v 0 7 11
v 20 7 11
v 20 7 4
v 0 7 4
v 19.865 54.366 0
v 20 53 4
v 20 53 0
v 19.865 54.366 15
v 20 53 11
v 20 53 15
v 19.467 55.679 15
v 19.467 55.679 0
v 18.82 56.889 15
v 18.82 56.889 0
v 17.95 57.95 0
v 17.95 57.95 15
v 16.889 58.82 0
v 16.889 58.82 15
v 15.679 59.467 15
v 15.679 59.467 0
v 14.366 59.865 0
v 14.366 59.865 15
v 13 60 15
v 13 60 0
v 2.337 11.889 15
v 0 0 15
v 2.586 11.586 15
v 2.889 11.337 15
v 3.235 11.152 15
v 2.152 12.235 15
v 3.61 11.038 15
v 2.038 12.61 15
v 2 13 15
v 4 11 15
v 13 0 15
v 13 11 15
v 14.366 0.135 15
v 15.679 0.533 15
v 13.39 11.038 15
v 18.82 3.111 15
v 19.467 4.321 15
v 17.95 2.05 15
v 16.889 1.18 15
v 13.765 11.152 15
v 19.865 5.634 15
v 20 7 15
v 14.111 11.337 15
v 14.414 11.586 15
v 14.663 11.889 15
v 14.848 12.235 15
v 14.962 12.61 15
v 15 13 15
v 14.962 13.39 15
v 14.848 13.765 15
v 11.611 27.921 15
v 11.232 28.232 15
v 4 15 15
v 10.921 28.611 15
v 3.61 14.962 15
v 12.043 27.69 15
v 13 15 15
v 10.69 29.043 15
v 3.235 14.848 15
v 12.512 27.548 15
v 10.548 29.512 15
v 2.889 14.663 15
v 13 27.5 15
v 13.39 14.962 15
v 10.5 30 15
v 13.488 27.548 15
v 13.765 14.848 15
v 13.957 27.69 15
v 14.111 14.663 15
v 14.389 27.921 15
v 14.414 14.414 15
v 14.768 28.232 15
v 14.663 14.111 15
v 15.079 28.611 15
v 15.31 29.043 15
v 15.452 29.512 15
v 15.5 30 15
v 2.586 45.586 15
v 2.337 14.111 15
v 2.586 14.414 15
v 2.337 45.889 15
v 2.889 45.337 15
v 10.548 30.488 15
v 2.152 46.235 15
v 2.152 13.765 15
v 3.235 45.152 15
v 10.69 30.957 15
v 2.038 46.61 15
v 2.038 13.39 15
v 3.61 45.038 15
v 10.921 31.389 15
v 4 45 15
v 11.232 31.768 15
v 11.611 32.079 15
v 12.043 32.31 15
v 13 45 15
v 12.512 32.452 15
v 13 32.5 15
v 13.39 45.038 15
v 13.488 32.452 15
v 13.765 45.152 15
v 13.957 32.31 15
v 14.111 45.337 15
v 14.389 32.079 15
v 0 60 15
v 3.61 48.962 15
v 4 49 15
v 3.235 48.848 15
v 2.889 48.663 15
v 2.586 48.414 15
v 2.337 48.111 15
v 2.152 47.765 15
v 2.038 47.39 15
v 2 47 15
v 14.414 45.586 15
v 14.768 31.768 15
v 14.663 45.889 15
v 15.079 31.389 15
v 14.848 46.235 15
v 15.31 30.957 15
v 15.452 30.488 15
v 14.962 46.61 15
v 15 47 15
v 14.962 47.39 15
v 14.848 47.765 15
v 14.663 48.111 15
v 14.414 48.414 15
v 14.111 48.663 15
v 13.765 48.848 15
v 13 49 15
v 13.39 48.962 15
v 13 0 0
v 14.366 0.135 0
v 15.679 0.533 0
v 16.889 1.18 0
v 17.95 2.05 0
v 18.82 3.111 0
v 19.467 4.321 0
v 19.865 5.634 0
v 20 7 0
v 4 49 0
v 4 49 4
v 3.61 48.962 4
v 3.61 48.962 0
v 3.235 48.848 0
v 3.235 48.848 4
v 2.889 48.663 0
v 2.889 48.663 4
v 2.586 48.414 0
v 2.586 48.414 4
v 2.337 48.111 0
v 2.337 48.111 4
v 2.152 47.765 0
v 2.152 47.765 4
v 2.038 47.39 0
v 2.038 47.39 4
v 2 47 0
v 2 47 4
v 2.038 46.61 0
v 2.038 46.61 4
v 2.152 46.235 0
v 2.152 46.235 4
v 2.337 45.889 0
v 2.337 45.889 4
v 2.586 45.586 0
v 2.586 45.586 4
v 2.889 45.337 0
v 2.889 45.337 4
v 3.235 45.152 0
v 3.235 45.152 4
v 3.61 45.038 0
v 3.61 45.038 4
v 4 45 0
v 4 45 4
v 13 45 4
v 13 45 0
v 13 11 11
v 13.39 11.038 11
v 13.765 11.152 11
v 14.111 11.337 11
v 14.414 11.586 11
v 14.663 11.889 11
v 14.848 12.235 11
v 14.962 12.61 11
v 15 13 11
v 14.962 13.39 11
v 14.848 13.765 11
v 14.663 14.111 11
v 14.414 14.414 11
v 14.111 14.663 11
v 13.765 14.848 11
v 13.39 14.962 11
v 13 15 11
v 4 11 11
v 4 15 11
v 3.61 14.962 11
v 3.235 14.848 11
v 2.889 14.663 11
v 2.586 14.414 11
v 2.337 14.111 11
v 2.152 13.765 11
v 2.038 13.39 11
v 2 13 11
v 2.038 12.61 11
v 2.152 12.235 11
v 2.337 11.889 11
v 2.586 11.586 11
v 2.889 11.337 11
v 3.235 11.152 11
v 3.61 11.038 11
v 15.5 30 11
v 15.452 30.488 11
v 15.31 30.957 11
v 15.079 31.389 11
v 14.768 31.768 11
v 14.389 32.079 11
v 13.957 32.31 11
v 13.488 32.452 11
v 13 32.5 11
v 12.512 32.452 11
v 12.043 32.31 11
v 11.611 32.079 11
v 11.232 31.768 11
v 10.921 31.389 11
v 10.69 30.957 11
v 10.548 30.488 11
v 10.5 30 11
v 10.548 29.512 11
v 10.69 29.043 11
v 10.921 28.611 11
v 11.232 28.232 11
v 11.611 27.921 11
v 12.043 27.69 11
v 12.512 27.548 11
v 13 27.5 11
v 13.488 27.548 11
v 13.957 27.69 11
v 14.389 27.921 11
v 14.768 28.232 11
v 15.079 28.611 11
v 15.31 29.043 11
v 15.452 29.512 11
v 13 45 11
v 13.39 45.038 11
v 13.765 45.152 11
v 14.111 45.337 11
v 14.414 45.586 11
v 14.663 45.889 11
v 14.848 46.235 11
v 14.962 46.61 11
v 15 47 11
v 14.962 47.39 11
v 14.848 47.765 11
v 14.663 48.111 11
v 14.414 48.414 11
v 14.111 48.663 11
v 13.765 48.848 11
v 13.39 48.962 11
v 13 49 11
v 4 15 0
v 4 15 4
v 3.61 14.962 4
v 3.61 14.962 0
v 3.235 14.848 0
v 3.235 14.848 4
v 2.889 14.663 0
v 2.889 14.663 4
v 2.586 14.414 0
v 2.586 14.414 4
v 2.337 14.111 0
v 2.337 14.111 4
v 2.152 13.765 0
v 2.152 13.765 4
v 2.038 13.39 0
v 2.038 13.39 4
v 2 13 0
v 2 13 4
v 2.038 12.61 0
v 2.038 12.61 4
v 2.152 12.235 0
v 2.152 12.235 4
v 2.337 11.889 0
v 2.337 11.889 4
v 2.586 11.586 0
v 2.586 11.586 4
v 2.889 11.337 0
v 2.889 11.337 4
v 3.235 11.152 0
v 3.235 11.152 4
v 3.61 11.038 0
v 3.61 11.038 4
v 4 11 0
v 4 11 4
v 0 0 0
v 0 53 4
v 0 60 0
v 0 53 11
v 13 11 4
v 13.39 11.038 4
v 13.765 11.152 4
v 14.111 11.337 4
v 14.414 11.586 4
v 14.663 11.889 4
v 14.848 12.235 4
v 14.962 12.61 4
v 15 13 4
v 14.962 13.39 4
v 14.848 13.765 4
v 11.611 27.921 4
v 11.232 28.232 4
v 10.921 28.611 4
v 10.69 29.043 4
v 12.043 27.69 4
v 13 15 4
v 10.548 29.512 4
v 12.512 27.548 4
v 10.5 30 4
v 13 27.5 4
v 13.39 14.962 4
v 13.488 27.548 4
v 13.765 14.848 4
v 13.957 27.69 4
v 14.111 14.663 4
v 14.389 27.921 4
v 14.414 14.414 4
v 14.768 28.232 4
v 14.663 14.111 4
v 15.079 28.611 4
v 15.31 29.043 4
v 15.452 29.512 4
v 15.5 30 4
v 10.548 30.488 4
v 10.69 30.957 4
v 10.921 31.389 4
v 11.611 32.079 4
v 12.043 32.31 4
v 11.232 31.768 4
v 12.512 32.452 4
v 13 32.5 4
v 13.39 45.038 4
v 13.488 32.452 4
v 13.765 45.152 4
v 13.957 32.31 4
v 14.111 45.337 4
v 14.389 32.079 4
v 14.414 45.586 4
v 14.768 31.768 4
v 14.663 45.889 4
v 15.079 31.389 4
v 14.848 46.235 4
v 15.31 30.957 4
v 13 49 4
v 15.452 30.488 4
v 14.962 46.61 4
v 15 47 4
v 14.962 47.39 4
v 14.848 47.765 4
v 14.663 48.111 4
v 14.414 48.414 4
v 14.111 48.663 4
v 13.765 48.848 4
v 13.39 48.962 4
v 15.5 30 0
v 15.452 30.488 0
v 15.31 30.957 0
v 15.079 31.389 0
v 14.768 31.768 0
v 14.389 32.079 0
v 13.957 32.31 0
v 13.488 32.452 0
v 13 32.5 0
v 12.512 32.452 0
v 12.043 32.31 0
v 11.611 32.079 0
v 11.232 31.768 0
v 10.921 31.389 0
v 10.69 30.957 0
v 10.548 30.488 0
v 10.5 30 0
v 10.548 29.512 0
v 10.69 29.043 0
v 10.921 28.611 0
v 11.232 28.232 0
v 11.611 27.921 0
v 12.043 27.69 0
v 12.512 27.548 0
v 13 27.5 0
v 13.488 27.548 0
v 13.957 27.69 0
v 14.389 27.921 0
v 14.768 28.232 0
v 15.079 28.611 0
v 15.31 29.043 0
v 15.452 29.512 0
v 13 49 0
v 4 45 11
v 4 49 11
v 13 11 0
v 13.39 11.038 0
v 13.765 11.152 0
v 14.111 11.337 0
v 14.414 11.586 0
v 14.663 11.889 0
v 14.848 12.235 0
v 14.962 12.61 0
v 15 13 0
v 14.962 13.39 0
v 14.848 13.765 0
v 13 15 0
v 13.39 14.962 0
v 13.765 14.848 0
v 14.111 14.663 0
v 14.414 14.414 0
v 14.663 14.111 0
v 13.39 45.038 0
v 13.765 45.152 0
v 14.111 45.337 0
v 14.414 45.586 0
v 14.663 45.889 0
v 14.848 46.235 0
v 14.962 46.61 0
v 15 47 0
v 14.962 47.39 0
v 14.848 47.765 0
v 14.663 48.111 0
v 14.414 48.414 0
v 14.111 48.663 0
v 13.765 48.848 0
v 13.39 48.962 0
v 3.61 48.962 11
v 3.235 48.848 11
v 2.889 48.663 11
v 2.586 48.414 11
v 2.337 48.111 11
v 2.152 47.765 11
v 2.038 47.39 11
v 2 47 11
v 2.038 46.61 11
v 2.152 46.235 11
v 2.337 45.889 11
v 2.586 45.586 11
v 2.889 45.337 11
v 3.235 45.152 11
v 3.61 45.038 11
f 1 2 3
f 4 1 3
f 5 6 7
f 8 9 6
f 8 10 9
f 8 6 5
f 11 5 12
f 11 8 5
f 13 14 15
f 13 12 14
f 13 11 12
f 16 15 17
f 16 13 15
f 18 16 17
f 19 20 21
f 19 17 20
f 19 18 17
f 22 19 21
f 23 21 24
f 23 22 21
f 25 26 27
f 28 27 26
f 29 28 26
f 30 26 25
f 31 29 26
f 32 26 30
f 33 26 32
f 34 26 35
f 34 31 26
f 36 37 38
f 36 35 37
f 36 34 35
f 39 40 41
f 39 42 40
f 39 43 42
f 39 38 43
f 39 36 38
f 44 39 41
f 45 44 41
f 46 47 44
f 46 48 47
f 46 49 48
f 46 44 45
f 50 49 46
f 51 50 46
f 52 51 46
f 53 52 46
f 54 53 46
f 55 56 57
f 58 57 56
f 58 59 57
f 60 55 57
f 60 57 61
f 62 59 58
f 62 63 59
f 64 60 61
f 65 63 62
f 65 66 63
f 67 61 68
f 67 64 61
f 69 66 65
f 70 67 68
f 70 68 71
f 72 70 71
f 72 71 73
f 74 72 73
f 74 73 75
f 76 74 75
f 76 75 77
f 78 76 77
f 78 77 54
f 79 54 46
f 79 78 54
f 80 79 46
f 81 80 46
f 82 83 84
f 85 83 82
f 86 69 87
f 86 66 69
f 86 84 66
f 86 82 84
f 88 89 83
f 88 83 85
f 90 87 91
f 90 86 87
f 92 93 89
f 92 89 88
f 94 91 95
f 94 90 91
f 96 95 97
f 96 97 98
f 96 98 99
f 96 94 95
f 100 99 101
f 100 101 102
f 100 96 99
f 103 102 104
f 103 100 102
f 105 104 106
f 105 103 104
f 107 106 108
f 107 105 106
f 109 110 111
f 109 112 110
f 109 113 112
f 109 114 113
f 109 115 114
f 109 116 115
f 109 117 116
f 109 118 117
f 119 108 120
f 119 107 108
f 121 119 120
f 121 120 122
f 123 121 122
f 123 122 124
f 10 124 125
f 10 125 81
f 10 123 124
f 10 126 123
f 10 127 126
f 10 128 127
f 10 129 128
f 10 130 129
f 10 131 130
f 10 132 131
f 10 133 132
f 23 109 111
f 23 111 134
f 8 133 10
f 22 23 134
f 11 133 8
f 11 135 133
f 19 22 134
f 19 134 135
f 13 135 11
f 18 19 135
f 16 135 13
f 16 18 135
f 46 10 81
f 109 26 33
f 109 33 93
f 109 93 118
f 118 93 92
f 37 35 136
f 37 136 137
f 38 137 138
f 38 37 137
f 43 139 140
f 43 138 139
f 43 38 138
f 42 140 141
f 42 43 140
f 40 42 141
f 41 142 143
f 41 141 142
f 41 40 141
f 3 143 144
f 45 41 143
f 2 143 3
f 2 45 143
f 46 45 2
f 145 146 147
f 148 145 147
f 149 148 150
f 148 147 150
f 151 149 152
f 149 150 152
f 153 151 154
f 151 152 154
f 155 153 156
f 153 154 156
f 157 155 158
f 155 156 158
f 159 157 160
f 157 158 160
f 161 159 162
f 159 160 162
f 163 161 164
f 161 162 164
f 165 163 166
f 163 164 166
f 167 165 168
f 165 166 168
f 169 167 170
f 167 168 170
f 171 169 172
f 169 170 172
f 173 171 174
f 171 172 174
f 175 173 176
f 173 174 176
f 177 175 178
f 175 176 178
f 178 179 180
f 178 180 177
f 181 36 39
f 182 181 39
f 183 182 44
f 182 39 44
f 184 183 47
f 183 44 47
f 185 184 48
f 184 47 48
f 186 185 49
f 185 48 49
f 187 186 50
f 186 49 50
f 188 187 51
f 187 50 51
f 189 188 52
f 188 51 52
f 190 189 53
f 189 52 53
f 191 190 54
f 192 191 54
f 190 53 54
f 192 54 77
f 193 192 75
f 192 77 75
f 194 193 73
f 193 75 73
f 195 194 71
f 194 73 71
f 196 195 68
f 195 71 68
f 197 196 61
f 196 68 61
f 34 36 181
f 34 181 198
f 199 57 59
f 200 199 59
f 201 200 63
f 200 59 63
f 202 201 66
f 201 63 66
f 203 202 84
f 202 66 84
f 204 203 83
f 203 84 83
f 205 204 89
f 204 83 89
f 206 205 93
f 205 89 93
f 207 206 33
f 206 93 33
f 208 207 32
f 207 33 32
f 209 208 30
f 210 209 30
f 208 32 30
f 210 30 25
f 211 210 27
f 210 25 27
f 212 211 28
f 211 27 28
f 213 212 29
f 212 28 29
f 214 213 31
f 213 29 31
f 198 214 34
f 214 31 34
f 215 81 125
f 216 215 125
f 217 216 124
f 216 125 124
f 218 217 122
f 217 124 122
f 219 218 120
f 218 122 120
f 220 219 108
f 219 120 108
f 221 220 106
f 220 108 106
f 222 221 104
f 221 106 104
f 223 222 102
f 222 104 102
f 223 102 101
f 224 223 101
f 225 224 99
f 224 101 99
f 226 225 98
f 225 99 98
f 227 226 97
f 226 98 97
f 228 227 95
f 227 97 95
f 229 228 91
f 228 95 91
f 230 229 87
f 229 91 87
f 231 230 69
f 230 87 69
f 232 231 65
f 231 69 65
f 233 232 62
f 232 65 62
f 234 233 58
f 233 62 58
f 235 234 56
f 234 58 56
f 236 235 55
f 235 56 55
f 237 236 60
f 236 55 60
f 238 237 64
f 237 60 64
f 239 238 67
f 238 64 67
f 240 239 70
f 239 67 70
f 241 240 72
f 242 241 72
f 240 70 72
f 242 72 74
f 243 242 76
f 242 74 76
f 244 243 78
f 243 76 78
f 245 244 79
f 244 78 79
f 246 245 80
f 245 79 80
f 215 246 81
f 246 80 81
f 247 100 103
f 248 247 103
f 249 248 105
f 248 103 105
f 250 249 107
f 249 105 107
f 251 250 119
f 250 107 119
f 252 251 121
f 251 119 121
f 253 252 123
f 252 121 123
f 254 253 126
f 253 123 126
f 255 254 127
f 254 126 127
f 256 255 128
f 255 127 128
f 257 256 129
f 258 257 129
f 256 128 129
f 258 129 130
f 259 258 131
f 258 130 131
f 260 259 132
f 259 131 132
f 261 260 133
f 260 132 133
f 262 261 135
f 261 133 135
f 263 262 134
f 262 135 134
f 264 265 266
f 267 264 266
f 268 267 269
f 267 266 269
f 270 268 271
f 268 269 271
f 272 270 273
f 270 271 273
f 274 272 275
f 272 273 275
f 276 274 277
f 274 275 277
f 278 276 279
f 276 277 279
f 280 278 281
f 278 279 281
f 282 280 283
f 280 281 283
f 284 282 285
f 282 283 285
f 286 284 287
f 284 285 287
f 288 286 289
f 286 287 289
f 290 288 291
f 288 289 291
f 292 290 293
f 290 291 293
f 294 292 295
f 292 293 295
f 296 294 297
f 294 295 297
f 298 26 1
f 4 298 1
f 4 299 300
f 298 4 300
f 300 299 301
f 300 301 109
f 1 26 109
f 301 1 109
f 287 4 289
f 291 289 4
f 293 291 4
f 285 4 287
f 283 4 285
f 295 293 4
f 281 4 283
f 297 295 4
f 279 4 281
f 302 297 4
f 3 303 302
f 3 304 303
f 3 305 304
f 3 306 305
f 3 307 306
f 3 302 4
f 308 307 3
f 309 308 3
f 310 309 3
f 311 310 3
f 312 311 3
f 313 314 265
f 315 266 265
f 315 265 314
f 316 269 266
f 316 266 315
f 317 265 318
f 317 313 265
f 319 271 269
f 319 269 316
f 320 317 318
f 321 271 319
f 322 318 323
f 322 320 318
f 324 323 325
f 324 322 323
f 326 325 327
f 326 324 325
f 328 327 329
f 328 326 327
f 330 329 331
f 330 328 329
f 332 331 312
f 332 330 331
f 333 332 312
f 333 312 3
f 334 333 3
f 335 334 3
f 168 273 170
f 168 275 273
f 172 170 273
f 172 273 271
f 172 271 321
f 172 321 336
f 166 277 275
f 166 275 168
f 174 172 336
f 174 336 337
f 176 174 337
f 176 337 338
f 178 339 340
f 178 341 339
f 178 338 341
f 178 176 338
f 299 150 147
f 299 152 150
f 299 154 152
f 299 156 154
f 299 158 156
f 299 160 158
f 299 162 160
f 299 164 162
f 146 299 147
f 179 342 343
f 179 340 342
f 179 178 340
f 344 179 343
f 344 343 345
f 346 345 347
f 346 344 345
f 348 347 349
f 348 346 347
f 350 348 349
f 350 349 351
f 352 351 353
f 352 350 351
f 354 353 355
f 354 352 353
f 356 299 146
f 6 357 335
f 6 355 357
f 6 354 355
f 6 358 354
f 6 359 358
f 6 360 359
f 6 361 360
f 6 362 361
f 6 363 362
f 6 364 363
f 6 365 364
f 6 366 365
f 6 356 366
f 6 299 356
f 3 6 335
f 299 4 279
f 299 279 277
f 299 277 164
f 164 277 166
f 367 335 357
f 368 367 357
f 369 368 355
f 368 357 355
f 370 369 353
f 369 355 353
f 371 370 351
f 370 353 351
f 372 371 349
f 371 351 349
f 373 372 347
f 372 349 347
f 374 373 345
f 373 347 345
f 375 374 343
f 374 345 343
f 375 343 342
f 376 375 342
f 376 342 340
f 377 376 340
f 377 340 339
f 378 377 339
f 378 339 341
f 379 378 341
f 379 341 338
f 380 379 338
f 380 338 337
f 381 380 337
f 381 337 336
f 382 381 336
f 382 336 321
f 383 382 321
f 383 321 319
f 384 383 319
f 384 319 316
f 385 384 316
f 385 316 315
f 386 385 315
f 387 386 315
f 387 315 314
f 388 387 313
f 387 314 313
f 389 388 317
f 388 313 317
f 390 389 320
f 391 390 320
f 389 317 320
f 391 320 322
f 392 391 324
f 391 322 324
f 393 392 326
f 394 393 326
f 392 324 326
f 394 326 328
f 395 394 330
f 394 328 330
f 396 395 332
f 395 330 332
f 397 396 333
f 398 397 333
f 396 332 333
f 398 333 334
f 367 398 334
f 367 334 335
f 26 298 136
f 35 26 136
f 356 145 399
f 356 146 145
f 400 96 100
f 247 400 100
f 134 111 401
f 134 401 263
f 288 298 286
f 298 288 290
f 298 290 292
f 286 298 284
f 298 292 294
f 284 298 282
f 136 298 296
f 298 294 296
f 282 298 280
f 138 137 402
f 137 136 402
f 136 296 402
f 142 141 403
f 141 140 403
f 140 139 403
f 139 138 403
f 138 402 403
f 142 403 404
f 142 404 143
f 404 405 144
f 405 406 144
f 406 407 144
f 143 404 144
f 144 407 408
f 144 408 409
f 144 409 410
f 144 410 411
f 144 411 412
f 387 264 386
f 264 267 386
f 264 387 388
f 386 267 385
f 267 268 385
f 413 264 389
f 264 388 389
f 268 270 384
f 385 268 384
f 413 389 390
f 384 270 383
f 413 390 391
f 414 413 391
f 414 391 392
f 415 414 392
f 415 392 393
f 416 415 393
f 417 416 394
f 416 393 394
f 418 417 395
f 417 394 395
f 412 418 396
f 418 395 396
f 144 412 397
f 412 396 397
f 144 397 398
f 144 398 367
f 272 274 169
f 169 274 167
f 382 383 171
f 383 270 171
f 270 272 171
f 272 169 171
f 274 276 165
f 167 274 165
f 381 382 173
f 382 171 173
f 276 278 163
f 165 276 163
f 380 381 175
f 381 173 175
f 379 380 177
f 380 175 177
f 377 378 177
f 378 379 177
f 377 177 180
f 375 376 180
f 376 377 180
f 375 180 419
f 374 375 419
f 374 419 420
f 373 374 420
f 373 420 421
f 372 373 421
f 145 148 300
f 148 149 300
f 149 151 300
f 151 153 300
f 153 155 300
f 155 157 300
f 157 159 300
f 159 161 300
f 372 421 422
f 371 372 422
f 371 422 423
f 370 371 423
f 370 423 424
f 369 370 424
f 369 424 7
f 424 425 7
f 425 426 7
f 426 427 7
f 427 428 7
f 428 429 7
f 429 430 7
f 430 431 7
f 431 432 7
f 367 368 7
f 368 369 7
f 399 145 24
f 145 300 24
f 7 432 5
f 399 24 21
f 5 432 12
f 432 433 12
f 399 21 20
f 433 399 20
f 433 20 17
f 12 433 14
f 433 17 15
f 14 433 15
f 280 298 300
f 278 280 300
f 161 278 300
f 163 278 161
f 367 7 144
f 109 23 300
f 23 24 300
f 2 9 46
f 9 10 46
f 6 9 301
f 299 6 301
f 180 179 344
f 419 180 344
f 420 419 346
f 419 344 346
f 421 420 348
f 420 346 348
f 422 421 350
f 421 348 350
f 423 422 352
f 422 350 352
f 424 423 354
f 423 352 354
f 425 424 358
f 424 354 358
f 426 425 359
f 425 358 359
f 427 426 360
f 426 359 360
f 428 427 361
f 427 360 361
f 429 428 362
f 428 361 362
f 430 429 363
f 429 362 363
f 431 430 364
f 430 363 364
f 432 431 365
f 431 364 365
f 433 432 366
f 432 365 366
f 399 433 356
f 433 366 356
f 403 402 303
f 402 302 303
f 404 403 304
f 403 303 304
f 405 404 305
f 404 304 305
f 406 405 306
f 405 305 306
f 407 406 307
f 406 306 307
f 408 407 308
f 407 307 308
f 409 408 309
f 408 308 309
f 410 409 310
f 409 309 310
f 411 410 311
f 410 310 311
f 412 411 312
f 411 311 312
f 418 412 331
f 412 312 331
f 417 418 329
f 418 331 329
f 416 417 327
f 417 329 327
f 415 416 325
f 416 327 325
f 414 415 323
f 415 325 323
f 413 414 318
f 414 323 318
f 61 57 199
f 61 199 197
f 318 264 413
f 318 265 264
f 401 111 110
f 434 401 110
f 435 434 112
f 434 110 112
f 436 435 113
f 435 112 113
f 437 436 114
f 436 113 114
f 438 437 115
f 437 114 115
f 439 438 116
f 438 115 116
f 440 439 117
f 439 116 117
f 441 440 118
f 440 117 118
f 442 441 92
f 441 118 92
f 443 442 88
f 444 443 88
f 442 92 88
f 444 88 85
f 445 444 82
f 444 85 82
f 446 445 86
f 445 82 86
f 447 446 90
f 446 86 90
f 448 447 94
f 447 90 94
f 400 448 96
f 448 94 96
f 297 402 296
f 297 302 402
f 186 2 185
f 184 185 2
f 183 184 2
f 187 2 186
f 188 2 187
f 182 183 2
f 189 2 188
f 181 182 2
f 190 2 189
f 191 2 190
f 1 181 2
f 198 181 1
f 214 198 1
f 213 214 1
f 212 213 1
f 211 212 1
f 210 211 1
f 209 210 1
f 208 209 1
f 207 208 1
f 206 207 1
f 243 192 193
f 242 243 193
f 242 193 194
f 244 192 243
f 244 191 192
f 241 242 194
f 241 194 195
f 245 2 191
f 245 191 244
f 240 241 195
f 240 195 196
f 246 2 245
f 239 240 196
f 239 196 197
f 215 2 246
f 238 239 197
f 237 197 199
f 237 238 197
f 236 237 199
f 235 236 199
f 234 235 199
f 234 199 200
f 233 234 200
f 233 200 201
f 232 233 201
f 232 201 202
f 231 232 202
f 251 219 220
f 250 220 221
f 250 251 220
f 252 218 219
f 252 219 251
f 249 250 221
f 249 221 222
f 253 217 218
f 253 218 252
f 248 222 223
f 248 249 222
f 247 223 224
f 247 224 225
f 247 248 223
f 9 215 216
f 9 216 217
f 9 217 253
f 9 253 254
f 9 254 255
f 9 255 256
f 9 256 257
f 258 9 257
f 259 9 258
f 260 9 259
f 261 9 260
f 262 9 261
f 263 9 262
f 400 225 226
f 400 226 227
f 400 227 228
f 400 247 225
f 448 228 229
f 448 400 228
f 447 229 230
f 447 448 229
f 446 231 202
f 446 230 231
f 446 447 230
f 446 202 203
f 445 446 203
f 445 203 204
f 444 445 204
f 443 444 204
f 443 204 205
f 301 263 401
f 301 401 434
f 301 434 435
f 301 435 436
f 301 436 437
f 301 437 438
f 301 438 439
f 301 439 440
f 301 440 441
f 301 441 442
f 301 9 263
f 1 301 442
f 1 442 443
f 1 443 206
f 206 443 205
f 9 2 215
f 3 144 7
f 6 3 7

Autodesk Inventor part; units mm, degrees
ref_plane "YZ Plane" through (0, 0, 0) normal (1, 0, 0) x (0, 1, 0)
ref_plane "XZ Plane" through (0, 0, 0) normal (0, 1, 0) x (-1, 0, 0)
ref_plane "XY Plane" through (0, 0, 0) normal (0, 0, 1) x (1, 0, 0)
sketch "Sketch1" plane through (0, 0, 0) normal (0, 0, 1) x (1, 0, 0)
  line L0 (0, 0) -> (20, 0)
  line L1 (20, 0) -> (20, 60)
  line L2 (20, 60) -> (0, 60)
  line L3 (0, 60) -> (0, 0)
  dimension "d0" = 20
  dimension "d1" = 60
extrude "Extrusion1" add sketch "Sketch1" along normal blind 15
fillet "Fillet1" radius 7 2 edges at (20, 60, 7.5) (20, 0, 7.5)
sketch "Sketch2" plane through (0, 0, 15) normal (0, 0, 1) x (1, 0, 0)
  arc A0 (20, 53) -> (13, 60) centre (13, 53) ccw projected
  line L0 (13, 60) -> (13, 32.5)
  line L1 (13, 60) -> (13, 47)
  arc A1 (13, 0) -> (20, 7) centre (13, 7) ccw projected
  line L2 (13, 0) -> (13, 13)
  line L3 (13, 47) -> (4, 47) construction
  line L4 (13, 45) -> (4, 45)
  line L5 (4, 49) -> (13, 49)
  arc A2 (13, 45) -> (13, 49) centre (13, 47) ccw
  arc A3 (4, 49) -> (4, 45) centre (4, 47) ccw
  line L6 (13, 13) -> (4, 13) construction
  line L7 (13, 11) -> (4, 11)
  line L8 (4, 15) -> (13, 15)
  arc A4 (13, 11) -> (13, 15) centre (13, 13) ccw
  arc A5 (4, 15) -> (4, 11) centre (4, 13) ccw
  line L9 (13, 60) -> (0, 60) projected
  line L10 (13, 60) -> (13, 30)
  circle A6 centre (13, 30) radius 2.5
  point P0 (0, 0)
  point P1 (8.5, 47)
  point P2 (8.5, 13)
  dimension "d5" = 27.5
  dimension "d7" = 13
  dimension "d8" = 13
  dimension "d13" = 30
  dimension "d14" = 5
extrude "Extrusion2" cut sketch "Sketch2" against normal through all
sketch "Sketch3" plane through (20, 7, 0) normal (1, 0, 0) x (0, 0, -1)
  line L0 (-14, 0) -> (-14, 46)
  line L1 (-14, 0) -> (-6, 0)
  line L2 (-6, 0) -> (-6, 46)
  line L3 (-6, 46) -> (-14, 46)
  line L4 (-14, 46) -> (-14, 0)
  point P0 (0, -7)
extrude "Extrusion3" cut sketch "Sketch3" against normal blind 20
sketch "Sketch4" plane through (0, 0, 15) normal (0, 0, 1) x (1, 0, 0)
  point P0 (0, 0)
sketch "Sketch5" plane through (0, 0, 15) normal (0, 0, 1) x (1, 0, 0)
  point P0 (0, 0)
sketch "Sketch6" plane through (20, 7, 14) normal (0, 0, -1) x (-1, 0, 0)
  line L0 (0, 46) -> (0, 0) projected
  line L1 (0, 0) -> (20, 0)
  line L2 (20, 0) -> (20, 46)
  line L3 (20, 46) -> (0, 46)
  line L4 (0, 46) -> (0, 0)
  point P0 (20, -7)
extrude "Extrusion4" add sketch "Sketch6" along normal blind 3
sketch "Sketch7" plane through (0, 0, 15) normal (0, 0, 1) x (1, 0, 0)
  circle A0 centre (13, 30) radius 2.5
  point P0 (0, 0)
extrude "Extrusion5" cut sketch "Sketch7" against normal through all
sketch "Sketch8" plane through (0, 0, 15) normal (0, 0, 1) x (1, 0, 0)
  arc A0 (13, 11) -> (13, 15) centre (13, 13) ccw projected
  line L0 (13, 11) -> (4, 11) projected
  line L1 (13, 11) -> (4, 11)
  line L2 (4, 11) -> (4, 11)
  line L3 (4, 11) -> (13, 11)
  line L4 (13, 11) -> (13, 11)
  arc A1 (13, 45) -> (13, 49) centre (13, 47) ccw projected
  line L5 (4, 45) -> (13, 45) projected
  line L6 (13, 45) -> (13, 45)
  line L7 (13, 45) -> (4, 45)
  line L8 (4, 45) -> (4, 45)
  line L9 (4, 45) -> (13, 45)
  arc A2 (13, 45) -> (13, 49) centre (13, 47) ccw
  arc A3 (4, 49) -> (4, 45) centre (4, 47) ccw projected
  arc A4 (4, 49) -> (4, 45) centre (4, 47) ccw
  arc A5 (13, 11) -> (13, 15) centre (13, 13) ccw
  arc A6 (4, 15) -> (4, 11) centre (4, 13) ccw
  line L10 (4, 15) -> (13, 15) projected
  line L11 (4, 15) -> (13, 15)
  line L12 (4, 49) -> (13, 49) projected
  line L13 (4, 49) -> (13, 49)
  arc A7 (4, 49) -> (4, 45) centre (4, 47) ccw projected
  line L14 (13, 45) -> (4, 45)
  arc A8 (4, 15) -> (4, 11) centre (4, 13) ccw projected
  arc A9 (4, 15) -> (4, 15) centre (4, 13) ccw
  point P0 (0, 0)
extrude "Extrusion6" cut sketch "Sketch8" against normal through all
sketch "Sketch9" plane through (20, 7, 6) normal (0, 0, 1) x (1, 0, 0)
  line L0 (0, 46) -> (-20, 46) projected
  arc A0 (-7, -7) -> (0, 0) centre (-7, 0) ccw projected
  line L1 (-20, 46) -> (0, 46)
  line L2 (0, 46) -> (0, 0)
  line L3 (0, 0) -> (-20, 0)
  line L4 (-20, 0) -> (-20, 46)
  point P0 (-20, -7)
extrude "Extrusion7" cut sketch "Sketch9" against normal blind 2
properties part number "3C_LiPoBatteryHolder_mountingBracket"
